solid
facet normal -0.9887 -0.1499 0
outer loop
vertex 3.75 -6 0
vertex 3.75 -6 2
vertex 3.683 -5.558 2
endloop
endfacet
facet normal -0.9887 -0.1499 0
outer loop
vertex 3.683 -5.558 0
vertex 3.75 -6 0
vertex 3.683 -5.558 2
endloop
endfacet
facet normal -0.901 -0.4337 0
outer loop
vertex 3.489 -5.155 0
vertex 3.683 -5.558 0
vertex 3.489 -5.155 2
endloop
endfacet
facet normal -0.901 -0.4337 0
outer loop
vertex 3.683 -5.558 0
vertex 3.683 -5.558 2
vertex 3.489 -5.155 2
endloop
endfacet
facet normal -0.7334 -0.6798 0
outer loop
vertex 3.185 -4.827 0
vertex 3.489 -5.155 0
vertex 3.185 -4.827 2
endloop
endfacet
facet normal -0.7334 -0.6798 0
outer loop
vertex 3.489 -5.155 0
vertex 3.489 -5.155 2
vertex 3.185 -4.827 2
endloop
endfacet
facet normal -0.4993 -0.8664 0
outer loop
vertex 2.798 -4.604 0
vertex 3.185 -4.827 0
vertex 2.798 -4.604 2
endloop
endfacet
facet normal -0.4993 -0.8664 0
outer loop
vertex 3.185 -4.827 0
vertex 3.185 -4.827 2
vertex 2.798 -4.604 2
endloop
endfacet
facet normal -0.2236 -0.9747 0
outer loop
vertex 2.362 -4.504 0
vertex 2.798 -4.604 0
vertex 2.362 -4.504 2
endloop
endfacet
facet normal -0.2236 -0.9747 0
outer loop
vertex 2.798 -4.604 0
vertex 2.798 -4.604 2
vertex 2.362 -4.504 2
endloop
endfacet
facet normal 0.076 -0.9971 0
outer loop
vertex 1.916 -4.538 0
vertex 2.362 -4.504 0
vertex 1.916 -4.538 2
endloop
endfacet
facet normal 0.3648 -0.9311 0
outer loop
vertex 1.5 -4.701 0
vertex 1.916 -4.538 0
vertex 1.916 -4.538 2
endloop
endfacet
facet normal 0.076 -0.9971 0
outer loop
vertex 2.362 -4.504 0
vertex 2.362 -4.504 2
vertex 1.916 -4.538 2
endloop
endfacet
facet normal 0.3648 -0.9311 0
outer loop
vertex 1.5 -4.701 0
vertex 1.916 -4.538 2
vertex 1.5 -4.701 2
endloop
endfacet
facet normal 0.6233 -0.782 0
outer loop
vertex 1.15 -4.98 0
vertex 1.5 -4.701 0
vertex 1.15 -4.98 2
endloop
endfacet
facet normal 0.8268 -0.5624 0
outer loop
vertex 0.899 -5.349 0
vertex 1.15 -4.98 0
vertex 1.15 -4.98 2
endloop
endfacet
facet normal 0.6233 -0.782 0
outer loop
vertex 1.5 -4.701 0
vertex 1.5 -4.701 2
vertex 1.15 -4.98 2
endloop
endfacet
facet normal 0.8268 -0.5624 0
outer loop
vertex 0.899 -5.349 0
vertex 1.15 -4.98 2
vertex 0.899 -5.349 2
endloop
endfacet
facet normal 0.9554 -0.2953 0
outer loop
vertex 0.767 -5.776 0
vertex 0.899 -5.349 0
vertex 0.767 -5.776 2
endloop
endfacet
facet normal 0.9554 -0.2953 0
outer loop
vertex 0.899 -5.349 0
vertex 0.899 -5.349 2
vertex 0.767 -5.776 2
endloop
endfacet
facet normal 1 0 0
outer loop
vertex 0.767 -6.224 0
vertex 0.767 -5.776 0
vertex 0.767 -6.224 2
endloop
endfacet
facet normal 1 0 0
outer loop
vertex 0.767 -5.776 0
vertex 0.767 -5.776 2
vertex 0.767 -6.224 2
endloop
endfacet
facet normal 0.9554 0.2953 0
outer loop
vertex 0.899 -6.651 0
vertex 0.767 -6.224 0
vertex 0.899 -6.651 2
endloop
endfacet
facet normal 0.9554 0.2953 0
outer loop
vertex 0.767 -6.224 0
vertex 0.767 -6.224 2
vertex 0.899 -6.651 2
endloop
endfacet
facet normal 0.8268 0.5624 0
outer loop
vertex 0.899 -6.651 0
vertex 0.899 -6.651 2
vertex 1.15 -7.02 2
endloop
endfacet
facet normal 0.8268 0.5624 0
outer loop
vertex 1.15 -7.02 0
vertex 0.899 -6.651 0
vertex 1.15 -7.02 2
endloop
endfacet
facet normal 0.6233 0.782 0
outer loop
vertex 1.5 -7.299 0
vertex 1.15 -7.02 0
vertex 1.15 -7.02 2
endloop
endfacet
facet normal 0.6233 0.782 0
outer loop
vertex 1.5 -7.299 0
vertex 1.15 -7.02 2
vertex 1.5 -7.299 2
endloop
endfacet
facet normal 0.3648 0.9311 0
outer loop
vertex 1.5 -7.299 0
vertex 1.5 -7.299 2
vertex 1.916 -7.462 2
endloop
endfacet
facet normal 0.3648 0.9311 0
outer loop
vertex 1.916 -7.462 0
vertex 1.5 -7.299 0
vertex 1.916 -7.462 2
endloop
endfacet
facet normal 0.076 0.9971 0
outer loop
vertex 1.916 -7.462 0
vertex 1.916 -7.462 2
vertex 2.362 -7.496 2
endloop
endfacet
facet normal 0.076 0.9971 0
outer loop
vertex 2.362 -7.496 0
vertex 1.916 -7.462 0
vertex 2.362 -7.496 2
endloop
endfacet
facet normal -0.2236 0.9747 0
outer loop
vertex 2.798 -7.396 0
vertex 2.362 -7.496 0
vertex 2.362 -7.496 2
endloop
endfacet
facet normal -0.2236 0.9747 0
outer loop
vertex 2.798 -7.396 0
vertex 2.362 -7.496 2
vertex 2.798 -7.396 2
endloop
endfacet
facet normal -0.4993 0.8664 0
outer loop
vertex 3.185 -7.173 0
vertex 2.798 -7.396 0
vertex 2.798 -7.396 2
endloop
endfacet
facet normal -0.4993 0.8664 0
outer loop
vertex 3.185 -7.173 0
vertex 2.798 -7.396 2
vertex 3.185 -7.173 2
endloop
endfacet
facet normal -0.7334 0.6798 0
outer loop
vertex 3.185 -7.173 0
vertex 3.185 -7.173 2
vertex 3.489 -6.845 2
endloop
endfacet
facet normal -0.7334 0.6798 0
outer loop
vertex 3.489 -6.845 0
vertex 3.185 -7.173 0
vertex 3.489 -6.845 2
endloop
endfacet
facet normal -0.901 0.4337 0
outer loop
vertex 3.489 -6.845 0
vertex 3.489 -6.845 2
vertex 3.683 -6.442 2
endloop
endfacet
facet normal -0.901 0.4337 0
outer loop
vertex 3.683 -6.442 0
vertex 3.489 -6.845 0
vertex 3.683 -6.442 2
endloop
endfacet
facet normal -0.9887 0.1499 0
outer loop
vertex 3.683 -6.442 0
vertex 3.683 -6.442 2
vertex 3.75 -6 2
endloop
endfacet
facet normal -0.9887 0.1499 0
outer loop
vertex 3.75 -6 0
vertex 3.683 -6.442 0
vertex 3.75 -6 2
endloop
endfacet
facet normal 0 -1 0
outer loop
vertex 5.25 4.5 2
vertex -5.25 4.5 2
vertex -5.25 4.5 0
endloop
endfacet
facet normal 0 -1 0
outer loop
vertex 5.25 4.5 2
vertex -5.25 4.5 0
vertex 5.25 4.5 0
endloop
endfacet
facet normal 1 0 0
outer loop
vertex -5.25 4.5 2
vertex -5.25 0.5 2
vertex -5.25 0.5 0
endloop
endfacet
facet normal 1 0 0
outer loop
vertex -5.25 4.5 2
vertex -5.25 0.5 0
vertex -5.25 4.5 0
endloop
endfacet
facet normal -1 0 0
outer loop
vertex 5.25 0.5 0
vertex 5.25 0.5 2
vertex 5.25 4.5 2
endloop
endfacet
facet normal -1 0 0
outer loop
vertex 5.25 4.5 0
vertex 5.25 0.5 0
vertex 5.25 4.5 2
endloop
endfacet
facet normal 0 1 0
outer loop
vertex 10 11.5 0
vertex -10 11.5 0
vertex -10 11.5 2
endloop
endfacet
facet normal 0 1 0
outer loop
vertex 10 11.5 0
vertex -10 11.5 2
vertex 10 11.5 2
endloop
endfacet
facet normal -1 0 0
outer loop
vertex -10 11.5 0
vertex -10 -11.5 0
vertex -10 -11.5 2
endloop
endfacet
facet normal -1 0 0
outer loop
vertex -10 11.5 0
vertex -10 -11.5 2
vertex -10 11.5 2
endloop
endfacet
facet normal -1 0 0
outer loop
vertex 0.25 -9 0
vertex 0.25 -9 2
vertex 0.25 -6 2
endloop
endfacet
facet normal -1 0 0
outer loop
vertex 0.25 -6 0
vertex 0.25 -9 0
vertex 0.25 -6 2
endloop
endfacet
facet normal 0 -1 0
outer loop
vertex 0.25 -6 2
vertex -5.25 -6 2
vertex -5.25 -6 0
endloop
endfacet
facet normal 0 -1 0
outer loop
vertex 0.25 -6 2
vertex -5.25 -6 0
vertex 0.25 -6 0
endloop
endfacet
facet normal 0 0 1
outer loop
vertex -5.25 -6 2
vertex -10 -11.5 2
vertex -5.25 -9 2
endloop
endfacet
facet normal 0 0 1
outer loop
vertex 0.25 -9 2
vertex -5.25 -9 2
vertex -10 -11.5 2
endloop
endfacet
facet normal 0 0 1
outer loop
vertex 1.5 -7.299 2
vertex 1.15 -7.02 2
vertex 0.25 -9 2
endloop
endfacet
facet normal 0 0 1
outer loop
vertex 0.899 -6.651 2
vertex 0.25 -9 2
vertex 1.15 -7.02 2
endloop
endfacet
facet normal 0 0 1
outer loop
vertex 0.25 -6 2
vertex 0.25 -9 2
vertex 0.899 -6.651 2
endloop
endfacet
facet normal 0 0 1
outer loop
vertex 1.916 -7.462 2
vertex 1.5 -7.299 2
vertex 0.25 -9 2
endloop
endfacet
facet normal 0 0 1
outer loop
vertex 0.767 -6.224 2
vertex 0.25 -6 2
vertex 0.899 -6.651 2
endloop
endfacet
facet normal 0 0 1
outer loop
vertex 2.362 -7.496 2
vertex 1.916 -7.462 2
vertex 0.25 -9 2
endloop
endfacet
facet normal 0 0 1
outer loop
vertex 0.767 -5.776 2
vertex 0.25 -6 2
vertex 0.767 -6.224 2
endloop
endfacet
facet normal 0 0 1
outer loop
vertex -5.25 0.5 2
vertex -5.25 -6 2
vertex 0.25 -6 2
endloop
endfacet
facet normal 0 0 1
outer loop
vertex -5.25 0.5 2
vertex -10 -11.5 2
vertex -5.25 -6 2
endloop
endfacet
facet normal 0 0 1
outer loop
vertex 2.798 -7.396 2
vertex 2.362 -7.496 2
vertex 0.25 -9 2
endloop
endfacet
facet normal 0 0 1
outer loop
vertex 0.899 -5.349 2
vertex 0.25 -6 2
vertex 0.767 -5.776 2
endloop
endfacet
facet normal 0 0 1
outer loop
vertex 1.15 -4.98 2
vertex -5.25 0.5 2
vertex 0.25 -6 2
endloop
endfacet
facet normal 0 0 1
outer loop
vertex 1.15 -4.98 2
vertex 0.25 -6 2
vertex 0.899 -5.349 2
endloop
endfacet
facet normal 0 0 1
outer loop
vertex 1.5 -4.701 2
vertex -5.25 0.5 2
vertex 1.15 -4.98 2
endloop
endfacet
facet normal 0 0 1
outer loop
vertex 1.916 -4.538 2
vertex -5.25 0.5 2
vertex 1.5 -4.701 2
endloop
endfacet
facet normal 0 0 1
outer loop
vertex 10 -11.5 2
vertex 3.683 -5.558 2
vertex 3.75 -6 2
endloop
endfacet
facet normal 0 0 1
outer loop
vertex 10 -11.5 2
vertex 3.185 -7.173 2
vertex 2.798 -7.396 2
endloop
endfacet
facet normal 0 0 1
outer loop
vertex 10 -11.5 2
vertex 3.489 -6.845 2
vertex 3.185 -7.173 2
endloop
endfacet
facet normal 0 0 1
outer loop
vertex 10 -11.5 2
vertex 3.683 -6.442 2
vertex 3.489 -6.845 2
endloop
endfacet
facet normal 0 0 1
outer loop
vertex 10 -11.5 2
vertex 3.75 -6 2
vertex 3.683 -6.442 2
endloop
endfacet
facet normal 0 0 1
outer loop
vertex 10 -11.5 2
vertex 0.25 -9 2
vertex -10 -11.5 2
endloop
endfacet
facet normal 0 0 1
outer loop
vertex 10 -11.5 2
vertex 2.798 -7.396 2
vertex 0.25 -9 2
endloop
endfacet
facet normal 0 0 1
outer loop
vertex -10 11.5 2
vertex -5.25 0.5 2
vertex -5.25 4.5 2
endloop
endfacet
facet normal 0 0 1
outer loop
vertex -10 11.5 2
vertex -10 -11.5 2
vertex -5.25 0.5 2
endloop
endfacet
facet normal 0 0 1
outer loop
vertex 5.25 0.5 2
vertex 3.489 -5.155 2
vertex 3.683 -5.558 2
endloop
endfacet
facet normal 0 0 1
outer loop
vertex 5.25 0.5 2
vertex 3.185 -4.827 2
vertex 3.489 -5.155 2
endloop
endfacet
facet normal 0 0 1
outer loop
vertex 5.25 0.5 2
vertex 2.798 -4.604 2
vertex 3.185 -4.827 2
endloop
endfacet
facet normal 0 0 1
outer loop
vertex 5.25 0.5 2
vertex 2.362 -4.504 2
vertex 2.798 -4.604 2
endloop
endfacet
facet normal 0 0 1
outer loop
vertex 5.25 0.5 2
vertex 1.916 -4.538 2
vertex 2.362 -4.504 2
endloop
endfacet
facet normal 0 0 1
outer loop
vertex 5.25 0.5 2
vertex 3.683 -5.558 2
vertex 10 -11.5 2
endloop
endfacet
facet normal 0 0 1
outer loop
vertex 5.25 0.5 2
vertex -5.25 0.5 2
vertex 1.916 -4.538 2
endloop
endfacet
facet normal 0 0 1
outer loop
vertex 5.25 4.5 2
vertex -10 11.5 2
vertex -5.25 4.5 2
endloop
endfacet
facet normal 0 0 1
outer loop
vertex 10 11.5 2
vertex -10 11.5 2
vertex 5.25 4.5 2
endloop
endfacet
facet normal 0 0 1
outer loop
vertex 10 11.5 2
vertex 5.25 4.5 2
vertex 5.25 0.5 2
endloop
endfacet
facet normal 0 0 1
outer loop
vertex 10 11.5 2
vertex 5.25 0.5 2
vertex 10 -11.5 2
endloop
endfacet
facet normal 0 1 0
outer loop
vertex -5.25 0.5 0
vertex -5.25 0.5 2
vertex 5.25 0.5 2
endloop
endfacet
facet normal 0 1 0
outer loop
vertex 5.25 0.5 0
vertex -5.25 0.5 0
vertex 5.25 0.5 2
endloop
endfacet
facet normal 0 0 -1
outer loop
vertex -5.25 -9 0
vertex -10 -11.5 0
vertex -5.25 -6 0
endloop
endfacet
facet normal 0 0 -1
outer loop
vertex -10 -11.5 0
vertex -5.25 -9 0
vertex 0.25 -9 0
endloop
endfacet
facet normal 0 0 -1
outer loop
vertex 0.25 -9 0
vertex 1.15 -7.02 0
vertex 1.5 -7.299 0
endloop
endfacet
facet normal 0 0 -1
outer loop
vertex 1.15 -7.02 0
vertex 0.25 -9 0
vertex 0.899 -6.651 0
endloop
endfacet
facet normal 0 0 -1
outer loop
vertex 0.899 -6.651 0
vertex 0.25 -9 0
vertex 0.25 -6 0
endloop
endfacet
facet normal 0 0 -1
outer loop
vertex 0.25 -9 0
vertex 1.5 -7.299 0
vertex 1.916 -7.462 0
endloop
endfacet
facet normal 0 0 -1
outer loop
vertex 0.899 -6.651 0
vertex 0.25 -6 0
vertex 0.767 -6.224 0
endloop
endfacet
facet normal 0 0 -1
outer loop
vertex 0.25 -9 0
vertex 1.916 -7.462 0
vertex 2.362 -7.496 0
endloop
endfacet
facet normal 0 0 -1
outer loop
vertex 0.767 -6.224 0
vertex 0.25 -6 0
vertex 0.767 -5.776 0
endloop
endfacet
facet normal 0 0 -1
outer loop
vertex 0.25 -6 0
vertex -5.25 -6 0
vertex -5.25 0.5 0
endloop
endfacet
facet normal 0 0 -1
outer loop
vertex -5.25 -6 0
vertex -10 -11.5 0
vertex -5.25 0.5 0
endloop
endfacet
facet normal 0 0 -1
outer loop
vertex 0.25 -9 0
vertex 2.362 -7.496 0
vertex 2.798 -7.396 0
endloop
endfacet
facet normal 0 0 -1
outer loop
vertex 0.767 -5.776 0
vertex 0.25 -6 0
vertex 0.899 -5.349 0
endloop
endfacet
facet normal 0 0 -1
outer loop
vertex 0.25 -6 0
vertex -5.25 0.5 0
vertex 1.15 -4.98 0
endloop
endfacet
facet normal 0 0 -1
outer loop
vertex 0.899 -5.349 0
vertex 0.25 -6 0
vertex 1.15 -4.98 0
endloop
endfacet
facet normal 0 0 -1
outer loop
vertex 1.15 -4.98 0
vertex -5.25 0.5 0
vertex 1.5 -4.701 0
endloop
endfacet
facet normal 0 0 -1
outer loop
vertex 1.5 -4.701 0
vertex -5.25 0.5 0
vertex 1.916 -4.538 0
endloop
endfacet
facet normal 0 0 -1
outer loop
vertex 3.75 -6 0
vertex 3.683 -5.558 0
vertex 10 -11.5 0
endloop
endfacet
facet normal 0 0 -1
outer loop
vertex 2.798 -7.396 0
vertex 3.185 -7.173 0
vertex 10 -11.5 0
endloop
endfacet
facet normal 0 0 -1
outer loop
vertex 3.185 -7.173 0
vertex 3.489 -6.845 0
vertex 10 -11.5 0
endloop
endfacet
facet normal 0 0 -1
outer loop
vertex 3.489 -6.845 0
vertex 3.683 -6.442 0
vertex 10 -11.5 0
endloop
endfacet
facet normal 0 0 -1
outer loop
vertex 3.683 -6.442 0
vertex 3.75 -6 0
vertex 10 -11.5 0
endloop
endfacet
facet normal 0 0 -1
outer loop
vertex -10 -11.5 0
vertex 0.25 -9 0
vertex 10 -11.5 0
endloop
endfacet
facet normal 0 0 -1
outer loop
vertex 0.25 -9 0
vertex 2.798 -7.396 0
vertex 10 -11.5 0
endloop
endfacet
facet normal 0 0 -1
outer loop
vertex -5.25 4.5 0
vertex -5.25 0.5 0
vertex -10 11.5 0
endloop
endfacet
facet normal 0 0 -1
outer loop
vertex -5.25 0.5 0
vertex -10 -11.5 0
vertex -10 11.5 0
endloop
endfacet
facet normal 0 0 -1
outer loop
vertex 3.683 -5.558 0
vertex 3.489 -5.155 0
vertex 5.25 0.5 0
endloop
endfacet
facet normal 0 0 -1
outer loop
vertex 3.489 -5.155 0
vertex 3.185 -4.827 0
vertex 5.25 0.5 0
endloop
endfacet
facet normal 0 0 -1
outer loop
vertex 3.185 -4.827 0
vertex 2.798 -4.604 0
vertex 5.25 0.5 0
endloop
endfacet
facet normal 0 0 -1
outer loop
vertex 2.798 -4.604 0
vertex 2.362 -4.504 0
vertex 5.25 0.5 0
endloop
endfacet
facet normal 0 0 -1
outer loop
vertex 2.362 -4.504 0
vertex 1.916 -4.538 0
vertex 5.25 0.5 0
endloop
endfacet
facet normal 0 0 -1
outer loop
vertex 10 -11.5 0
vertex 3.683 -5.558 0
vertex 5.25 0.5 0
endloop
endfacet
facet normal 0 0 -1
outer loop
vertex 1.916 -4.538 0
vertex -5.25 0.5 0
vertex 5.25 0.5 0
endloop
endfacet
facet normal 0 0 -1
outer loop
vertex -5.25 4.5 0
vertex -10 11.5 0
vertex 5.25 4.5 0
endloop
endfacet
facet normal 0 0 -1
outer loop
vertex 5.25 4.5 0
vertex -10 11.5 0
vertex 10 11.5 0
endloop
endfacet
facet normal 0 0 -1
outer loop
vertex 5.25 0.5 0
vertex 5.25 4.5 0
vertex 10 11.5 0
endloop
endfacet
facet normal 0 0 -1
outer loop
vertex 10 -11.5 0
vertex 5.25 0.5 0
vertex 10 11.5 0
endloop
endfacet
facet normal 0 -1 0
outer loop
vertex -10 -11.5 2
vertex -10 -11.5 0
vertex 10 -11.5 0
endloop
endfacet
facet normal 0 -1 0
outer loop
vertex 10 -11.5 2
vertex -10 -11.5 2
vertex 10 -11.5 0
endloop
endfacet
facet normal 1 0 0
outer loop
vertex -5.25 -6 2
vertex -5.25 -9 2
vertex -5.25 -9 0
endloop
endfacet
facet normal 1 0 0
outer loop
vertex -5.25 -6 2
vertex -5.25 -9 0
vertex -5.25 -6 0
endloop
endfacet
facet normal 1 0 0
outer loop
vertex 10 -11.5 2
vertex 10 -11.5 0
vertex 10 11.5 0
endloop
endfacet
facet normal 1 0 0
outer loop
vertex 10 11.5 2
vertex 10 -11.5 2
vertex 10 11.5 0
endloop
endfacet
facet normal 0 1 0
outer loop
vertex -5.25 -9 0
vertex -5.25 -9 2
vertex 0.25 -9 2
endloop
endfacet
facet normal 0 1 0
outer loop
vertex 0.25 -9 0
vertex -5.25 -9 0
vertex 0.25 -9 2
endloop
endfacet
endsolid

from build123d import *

# Parameters (mm, degrees)
SKETCH1_W           = 20
SKETCH1_H           = 23
BOSS_EXTRUDE1_DEPTH = 2
SKETCH2_W           = 10.5
SKETCH2_H           = 4
SKETCH2_W_2         = 5.5
SKETCH2_H_2         = 3
SKETCH2_R           = 1.5
CUT_EXTRUDE1_DEPTH  = 10


with BuildPart() as part:
    # Sketch1 → Boss-Extrude1 (new body)
    with BuildSketch(Plane.XY):
        Rectangle(SKETCH1_W, SKETCH1_H)
    extrude(amount=BOSS_EXTRUDE1_DEPTH)

    # Sketch2 → Cut-Extrude1 (cut)
    with BuildSketch(Plane.XY.offset(2)):
        with Locations((0, 2.5)):
            Rectangle(SKETCH2_W, SKETCH2_H)
        with Locations((-2.5, -7.5)):
            Rectangle(SKETCH2_W_2, SKETCH2_H_2)
        with Locations((2.25, -6)):
            Circle(SKETCH2_R)
    extrude(amount=-CUT_EXTRUDE1_DEPTH, mode=Mode.SUBTRACT)


solid = part.part
